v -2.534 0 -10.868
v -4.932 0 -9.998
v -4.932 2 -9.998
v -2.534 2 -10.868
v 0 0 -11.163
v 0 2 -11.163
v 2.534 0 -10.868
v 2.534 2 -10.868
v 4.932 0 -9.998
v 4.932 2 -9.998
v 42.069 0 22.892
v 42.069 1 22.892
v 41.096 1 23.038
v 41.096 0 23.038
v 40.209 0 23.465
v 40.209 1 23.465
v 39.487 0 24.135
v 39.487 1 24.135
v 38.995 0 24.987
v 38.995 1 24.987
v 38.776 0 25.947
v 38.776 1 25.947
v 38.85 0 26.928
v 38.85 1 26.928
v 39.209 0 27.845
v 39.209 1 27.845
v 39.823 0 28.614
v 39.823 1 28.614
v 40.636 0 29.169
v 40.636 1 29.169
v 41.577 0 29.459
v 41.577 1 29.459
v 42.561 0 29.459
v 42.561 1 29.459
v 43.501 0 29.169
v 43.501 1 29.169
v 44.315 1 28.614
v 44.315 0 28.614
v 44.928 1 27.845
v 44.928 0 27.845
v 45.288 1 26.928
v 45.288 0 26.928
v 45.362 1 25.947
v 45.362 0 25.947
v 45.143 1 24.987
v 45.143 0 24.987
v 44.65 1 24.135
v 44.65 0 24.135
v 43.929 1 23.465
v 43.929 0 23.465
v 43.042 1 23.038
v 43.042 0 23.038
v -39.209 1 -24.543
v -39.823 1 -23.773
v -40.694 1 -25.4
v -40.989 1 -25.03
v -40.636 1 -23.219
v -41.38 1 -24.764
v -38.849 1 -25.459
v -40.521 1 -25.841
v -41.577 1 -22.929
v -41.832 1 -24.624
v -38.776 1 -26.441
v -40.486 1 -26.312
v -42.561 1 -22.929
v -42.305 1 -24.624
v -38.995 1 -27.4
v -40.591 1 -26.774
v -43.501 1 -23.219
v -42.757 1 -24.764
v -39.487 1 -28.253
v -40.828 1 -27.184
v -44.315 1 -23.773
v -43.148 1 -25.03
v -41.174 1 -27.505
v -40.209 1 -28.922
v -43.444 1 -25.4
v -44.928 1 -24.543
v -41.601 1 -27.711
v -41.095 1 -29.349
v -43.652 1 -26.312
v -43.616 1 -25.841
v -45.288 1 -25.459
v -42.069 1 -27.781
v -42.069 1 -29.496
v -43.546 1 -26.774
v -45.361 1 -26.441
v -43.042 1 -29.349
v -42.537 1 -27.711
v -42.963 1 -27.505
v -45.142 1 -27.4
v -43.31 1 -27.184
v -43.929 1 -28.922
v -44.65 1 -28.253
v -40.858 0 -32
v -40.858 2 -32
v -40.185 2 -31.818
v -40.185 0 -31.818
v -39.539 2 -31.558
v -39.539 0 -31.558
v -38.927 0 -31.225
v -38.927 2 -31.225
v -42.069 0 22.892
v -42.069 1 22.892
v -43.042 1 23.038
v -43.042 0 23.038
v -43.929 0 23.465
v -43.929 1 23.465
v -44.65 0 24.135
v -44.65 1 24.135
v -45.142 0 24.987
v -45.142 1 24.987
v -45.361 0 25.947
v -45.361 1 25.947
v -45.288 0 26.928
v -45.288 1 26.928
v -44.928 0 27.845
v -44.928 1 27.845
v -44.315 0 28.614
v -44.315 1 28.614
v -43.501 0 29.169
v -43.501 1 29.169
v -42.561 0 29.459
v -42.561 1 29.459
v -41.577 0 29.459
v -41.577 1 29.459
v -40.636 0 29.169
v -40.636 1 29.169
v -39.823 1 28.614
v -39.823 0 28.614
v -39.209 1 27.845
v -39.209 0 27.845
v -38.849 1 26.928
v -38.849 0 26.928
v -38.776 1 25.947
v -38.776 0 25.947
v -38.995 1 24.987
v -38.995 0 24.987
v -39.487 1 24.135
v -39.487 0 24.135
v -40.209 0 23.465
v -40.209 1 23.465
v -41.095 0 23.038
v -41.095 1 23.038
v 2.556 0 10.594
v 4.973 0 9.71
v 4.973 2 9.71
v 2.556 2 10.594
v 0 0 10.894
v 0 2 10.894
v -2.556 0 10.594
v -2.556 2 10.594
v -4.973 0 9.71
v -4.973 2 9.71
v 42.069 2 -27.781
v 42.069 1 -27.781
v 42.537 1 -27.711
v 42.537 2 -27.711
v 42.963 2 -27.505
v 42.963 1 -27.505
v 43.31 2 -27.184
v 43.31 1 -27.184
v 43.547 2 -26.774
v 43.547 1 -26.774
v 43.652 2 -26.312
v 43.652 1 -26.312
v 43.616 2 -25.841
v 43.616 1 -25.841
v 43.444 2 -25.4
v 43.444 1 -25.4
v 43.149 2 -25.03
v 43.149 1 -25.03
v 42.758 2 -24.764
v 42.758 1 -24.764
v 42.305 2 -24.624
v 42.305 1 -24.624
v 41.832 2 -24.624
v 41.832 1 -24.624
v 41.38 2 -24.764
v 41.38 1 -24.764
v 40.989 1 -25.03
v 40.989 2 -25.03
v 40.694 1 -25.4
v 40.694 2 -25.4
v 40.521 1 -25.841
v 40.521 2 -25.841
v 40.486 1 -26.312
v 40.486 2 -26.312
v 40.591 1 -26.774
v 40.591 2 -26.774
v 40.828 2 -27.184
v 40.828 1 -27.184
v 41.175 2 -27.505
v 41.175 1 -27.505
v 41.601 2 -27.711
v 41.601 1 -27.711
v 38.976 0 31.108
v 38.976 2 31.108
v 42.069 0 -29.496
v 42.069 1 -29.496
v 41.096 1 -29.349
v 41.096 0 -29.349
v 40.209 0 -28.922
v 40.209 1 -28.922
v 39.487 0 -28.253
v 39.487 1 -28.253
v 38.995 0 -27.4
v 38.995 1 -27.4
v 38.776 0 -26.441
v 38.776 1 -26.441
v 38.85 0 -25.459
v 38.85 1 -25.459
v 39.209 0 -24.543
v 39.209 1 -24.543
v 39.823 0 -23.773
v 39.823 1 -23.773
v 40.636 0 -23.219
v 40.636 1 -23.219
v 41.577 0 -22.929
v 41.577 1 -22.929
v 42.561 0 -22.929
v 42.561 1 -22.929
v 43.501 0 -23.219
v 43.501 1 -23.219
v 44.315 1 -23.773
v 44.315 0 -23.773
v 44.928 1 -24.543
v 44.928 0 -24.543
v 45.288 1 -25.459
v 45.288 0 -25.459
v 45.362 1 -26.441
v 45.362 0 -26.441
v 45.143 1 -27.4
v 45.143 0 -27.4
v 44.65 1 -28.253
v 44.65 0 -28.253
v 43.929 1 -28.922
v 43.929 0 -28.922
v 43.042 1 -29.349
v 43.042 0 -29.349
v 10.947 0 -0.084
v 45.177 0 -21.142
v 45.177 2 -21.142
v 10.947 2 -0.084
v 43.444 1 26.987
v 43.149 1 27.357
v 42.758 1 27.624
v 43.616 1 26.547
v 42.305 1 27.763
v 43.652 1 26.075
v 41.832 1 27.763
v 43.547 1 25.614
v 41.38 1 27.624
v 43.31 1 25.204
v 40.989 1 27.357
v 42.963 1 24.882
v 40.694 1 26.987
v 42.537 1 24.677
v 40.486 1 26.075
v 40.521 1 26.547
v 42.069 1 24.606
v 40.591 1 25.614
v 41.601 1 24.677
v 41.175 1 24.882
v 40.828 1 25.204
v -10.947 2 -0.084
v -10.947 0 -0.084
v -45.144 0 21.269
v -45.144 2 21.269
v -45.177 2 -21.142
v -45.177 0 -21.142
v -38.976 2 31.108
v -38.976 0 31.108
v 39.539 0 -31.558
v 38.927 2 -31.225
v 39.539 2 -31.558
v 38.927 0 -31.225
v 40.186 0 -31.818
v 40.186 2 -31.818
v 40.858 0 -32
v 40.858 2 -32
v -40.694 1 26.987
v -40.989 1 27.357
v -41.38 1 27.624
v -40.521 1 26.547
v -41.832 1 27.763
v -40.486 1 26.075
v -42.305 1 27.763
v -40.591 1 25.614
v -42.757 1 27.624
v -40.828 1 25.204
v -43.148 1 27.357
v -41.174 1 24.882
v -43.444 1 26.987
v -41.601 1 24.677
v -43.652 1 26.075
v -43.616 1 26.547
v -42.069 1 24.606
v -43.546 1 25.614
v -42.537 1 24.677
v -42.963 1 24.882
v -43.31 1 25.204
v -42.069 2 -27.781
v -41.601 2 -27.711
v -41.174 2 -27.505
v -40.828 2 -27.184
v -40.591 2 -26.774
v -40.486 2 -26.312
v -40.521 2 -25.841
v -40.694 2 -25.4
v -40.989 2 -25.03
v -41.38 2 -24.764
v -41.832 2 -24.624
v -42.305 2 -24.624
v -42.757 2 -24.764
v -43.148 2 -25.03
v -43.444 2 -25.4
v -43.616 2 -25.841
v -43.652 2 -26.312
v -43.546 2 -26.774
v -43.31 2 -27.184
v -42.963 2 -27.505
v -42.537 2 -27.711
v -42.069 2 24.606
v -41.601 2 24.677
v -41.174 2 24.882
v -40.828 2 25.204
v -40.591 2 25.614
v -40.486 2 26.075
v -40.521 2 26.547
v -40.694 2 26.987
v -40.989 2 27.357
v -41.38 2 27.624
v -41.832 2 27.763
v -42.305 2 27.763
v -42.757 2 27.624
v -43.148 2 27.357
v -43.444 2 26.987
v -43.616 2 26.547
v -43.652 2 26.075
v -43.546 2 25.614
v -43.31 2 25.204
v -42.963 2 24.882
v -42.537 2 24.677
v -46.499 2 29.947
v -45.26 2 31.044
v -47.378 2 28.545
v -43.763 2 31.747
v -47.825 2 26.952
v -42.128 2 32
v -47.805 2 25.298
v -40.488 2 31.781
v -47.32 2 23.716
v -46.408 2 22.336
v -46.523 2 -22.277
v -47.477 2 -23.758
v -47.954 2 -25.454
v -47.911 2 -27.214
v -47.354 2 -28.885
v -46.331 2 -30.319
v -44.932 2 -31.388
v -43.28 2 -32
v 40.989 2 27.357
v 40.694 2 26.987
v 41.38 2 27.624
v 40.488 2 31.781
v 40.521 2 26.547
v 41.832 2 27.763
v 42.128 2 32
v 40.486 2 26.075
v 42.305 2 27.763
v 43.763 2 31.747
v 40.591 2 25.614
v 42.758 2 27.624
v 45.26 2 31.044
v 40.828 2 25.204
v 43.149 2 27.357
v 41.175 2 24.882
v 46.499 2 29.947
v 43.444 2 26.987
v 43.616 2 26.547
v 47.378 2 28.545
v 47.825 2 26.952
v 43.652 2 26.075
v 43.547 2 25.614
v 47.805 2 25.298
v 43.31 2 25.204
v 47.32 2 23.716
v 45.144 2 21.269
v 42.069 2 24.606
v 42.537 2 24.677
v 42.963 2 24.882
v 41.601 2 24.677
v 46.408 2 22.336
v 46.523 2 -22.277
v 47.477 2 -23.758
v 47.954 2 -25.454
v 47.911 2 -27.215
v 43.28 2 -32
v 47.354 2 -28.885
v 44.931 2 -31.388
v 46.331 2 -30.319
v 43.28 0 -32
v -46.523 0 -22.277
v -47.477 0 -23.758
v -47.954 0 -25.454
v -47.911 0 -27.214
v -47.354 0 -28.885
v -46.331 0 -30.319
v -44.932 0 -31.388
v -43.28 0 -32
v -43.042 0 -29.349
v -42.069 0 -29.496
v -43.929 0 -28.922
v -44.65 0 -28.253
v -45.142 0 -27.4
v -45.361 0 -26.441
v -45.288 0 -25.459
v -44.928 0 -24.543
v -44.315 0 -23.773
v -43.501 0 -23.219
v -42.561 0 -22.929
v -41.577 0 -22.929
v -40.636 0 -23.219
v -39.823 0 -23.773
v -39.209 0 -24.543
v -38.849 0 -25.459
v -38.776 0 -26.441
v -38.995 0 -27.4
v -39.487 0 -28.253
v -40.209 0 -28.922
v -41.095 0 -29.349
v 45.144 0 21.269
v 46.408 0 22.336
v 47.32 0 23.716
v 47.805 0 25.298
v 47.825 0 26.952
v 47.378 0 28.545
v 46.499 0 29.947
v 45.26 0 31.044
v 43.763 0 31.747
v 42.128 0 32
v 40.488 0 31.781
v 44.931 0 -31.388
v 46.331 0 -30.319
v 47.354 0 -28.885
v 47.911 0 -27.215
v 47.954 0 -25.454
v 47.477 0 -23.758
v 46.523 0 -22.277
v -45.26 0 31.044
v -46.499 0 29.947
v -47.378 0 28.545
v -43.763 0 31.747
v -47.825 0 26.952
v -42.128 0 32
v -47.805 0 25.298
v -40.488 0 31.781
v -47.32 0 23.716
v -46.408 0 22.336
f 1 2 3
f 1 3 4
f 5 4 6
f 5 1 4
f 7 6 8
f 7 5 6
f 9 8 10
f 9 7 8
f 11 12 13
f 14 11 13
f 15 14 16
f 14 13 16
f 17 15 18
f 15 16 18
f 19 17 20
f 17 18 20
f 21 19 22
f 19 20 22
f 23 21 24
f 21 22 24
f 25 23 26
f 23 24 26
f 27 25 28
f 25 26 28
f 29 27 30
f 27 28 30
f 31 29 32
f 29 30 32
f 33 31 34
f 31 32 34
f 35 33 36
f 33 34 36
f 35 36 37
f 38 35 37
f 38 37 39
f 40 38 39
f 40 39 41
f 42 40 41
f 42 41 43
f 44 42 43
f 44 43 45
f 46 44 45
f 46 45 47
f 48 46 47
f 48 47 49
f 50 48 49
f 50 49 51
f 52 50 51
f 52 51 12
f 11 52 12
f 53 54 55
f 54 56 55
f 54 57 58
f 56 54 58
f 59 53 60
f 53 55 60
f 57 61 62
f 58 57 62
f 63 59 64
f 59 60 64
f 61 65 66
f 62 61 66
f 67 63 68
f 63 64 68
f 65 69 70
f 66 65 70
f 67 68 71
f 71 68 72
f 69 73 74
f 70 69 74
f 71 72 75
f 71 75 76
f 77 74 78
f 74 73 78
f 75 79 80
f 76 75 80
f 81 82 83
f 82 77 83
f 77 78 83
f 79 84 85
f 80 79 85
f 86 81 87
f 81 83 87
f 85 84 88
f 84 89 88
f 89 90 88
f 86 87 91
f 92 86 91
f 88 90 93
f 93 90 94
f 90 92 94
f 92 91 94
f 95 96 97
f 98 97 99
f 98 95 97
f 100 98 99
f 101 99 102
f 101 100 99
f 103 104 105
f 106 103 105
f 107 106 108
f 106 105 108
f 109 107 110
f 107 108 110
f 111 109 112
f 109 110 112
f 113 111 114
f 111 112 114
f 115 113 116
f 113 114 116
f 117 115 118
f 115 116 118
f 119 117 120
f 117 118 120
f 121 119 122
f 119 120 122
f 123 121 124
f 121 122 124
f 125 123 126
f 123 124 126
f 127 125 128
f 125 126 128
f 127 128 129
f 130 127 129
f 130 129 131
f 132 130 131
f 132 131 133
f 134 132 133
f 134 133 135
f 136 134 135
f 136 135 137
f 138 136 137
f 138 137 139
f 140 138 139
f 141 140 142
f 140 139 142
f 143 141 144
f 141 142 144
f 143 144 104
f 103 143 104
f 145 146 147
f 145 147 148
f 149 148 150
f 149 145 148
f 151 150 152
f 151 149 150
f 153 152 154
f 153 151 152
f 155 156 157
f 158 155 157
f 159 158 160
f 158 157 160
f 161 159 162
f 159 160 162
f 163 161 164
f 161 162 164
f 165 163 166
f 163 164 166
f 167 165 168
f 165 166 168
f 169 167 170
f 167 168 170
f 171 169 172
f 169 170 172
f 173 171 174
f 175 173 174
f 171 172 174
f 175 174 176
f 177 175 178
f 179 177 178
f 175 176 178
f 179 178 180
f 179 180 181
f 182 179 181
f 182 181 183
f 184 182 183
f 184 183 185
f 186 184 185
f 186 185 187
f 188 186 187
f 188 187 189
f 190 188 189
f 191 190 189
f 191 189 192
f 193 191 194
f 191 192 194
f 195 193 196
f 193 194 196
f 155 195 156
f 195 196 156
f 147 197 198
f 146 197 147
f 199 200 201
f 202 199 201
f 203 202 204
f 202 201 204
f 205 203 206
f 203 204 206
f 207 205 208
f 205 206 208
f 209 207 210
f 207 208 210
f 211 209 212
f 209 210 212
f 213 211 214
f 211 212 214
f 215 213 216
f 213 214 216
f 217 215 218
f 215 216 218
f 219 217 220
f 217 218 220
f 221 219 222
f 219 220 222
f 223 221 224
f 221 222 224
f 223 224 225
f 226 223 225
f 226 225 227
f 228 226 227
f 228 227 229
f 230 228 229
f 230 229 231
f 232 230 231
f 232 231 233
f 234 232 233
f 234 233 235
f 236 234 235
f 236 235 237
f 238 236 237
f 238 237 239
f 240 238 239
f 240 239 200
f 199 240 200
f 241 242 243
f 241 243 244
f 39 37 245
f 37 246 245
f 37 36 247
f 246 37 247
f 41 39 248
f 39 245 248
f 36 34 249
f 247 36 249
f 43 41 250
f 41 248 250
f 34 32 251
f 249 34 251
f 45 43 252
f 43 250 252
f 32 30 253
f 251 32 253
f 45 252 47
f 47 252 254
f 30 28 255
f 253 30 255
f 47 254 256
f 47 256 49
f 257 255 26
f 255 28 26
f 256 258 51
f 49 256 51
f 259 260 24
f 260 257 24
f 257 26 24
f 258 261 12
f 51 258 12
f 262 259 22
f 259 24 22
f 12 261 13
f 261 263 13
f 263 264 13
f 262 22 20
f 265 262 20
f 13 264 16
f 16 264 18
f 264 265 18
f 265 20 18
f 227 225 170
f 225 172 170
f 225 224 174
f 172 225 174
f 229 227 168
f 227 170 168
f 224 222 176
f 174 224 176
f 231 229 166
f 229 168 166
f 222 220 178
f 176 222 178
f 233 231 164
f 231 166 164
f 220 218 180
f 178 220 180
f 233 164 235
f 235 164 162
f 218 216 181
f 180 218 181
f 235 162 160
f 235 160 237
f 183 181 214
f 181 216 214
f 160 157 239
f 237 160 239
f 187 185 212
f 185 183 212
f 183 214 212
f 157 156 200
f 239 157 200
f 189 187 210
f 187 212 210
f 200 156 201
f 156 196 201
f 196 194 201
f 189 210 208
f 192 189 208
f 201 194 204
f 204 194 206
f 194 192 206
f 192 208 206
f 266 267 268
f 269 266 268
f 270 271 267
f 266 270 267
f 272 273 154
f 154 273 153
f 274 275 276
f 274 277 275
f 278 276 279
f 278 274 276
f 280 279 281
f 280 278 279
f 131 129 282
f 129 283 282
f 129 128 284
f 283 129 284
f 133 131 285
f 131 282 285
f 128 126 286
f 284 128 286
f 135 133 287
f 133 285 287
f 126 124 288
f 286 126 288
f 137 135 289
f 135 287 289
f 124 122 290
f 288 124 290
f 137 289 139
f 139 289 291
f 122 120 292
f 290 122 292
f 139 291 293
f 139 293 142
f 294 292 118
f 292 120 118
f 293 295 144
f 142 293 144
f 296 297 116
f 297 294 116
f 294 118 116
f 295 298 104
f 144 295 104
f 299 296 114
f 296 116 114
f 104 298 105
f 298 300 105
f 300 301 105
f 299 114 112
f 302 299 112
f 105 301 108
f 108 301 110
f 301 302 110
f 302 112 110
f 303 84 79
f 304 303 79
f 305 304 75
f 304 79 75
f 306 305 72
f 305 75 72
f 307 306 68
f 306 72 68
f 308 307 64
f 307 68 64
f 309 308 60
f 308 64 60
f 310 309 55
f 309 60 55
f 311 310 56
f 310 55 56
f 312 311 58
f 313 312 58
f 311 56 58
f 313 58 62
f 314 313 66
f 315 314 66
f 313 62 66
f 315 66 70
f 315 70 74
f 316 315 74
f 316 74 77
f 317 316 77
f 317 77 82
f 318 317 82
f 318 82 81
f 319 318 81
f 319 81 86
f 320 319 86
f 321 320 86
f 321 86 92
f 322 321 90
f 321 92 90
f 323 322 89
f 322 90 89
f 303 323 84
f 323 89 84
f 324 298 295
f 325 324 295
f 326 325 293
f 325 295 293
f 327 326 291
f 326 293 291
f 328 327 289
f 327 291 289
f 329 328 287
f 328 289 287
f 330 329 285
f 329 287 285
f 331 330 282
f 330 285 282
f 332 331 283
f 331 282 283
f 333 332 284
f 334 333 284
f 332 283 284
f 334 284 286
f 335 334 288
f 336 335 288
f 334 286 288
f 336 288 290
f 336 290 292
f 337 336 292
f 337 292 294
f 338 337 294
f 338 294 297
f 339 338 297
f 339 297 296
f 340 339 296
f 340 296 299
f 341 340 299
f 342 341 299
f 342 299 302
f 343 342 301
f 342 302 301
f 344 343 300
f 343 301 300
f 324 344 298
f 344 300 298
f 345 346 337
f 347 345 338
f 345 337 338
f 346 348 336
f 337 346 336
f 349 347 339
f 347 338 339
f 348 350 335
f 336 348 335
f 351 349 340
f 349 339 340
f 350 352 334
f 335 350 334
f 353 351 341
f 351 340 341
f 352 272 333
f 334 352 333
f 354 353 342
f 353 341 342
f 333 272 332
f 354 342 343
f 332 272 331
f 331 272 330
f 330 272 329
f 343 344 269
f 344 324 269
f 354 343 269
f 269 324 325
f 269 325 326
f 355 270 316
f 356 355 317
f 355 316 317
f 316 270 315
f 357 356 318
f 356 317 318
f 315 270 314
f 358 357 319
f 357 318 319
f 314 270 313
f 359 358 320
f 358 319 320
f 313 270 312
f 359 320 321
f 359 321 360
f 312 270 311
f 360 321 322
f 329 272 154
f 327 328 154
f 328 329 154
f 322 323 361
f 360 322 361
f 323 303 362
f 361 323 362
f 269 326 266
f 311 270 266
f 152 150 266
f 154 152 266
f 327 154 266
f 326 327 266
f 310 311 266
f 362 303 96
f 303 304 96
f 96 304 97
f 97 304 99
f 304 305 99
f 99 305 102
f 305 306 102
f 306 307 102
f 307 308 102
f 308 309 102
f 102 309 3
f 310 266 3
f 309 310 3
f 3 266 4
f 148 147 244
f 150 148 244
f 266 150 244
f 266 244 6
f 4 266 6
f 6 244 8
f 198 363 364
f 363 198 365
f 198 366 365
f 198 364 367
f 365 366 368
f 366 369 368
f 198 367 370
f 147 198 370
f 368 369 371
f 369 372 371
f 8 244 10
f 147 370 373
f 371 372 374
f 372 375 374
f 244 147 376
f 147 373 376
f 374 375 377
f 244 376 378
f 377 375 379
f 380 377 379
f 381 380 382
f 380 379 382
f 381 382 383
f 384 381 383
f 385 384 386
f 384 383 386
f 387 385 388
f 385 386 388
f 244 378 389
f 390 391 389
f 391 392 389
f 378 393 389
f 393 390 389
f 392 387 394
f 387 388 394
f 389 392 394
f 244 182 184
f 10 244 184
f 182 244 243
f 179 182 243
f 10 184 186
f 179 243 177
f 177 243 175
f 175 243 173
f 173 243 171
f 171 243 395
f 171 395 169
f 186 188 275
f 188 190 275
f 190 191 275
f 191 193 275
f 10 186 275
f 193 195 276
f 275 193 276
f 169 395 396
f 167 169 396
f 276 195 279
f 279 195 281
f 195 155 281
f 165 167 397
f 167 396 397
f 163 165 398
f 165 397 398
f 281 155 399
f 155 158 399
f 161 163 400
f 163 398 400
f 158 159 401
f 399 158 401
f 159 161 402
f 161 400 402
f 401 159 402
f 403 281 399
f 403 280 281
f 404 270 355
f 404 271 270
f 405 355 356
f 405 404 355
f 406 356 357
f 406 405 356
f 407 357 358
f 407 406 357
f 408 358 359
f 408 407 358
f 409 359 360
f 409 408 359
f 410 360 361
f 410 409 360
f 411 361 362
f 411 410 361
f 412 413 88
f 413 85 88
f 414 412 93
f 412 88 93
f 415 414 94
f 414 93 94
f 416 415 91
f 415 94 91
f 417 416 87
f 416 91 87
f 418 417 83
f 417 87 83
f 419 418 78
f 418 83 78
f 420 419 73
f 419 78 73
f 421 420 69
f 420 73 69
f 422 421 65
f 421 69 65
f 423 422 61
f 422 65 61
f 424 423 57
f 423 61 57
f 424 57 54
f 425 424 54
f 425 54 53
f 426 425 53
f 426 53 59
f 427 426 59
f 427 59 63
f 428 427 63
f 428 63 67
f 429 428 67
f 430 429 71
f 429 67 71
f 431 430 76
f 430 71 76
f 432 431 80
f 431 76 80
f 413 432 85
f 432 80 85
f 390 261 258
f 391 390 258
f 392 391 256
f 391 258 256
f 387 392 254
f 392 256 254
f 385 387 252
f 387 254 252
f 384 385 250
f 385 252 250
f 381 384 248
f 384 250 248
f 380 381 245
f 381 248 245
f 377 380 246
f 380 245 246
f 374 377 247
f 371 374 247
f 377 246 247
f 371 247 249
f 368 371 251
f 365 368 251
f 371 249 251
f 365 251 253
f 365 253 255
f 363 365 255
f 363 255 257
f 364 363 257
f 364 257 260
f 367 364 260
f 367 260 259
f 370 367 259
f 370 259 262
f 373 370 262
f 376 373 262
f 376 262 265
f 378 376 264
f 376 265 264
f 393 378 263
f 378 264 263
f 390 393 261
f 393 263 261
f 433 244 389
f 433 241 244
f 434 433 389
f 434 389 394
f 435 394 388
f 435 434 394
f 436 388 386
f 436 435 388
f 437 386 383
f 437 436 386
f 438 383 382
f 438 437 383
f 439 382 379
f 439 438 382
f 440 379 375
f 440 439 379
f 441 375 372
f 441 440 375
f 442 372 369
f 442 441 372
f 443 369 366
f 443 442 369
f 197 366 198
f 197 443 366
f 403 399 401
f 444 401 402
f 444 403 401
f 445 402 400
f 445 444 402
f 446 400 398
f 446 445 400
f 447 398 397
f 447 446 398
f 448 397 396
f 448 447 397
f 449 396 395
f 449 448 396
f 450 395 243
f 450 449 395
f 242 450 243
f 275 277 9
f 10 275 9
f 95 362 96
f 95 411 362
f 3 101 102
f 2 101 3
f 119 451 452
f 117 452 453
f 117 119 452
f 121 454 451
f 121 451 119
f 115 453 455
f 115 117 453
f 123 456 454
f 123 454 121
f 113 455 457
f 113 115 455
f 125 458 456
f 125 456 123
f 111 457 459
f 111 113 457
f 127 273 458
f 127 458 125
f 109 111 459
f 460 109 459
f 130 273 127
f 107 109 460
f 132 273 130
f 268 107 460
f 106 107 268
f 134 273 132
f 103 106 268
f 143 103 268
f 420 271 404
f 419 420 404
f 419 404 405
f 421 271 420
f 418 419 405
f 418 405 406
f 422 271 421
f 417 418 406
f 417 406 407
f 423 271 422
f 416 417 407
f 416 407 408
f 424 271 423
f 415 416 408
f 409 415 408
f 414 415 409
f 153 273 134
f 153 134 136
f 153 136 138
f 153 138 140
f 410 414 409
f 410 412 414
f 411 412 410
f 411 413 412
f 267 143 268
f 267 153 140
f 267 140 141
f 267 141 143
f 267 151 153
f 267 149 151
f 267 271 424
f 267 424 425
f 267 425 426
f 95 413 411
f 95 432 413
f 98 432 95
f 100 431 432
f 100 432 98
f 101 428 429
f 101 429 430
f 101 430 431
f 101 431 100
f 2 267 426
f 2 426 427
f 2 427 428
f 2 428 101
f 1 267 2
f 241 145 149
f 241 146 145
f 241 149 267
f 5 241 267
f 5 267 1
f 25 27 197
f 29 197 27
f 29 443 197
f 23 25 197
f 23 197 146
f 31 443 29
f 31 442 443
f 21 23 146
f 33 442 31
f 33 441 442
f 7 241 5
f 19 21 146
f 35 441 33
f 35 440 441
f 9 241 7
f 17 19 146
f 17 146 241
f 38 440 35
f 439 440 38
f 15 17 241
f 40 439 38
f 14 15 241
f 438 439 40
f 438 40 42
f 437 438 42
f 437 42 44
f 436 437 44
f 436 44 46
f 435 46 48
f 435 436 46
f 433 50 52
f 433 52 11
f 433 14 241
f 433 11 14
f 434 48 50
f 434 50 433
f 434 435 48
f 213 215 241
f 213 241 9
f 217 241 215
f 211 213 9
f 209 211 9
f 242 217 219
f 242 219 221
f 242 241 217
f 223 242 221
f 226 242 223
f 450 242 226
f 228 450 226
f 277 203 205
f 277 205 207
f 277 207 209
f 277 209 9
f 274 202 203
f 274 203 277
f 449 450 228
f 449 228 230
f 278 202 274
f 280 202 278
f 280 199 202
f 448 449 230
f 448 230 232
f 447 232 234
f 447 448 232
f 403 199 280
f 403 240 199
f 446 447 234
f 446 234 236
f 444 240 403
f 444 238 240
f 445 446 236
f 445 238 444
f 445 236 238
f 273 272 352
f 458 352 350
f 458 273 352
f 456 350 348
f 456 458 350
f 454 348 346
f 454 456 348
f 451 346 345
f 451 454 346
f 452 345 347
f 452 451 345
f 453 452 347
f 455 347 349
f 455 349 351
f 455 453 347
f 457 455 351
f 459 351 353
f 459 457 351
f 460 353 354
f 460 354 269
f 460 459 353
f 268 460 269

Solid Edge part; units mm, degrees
sketch "Sketch1" plane through (0, 0, 0) normal (0, -1, 0) x (1, 0, 0)
  line L0 (48, 32) -> (-48, 32)
  line L1 (-48, 32) -> (-48, -32)
  line L2 (-48, -32) -> (48, -32)
  line L3 (48, -32) -> (48, 32)
extrude "Protrusion1" add sketch "Sketch1" against normal blind 2
hole "Hole_1" at (-42.0687, 0, 26.1937) direction (0, 1, 0) diameter 3.175 end up to next counterbore diameter 6.604 counterbore depth 1
hole "Hole1" at (42.0688, 0, 26.1937) direction (0, 1, 0) diameter 3.175 end up to next counterbore diameter 6.604 counterbore depth 1
hole "Hole2" at (42.0688, 0, -26.1938) direction (0, 1, 0) diameter 3.175 end up to next counterbore diameter 6.604 counterbore depth 1
hole "Hole3" at (-42.0687, 0, -26.1938) direction (0, 1, 0) diameter 3.175 end up to next counterbore diameter 6.604 counterbore depth 1
sketch "Sketch2" plane through (0, 0, 0) normal (0, -1, 0) x (1, 0, 0)
  line L0 (59.2211, 38.1609) -> (-59.2211, 38.1609)
  line L1 (-59.2211, 38.1609) -> (-59.2211, -38.4291)
  line L2 (-59.2211, -38.4291) -> (59.2211, -38.4291)
  line L3 (59.2211, -38.4291) -> (59.2211, 38.1609)
  line L4 (-38.9763, 31.1079) -> (-4.9726, 9.7098)
  arc A0 (-4.9726, 9.7098) -> (4.9726, 9.7098) centre (0, -0.1341) cw
  line L5 (38.9763, 31.1079) -> (4.9726, 9.7098)
  line L6 (10.9467, -0.0838) -> (45.1439, 21.2687)
  line L7 (45.1766, -21.1419) -> (10.9467, -0.0838)
  line L8 (38.9274, -31.2248) -> (4.932, -9.9983)
  line L9 (-38.9274, -31.2248) -> (-4.932, -9.9983)
  line L10 (-45.1766, -21.1419) -> (-10.9467, -0.0838)
  line L11 (-10.9467, -0.0838) -> (-45.1439, 21.2687)
  arc A1 (38.9763, 31.1078) -> (45.1439, 21.2687) centre (42.0688, 26.1937) cw
  arc A2 (45.1766, -21.1419) -> (38.9275, -31.2247) centre (42.0688, -26.1937) cw
  arc A3 (4.932, -9.9983) -> (-4.932, -9.9983) centre (0, -0.1341) cw
  arc A4 (-38.9274, -31.2248) -> (-45.1765, -21.142) centre (-42.0687, -26.1938) cw
  arc A5 (-45.1439, 21.2687) -> (-38.9763, 31.108) centre (-42.0687, 26.1937) cw
extrude "Cutout1" cut sketch "Sketch2" against normal blind 174.286
